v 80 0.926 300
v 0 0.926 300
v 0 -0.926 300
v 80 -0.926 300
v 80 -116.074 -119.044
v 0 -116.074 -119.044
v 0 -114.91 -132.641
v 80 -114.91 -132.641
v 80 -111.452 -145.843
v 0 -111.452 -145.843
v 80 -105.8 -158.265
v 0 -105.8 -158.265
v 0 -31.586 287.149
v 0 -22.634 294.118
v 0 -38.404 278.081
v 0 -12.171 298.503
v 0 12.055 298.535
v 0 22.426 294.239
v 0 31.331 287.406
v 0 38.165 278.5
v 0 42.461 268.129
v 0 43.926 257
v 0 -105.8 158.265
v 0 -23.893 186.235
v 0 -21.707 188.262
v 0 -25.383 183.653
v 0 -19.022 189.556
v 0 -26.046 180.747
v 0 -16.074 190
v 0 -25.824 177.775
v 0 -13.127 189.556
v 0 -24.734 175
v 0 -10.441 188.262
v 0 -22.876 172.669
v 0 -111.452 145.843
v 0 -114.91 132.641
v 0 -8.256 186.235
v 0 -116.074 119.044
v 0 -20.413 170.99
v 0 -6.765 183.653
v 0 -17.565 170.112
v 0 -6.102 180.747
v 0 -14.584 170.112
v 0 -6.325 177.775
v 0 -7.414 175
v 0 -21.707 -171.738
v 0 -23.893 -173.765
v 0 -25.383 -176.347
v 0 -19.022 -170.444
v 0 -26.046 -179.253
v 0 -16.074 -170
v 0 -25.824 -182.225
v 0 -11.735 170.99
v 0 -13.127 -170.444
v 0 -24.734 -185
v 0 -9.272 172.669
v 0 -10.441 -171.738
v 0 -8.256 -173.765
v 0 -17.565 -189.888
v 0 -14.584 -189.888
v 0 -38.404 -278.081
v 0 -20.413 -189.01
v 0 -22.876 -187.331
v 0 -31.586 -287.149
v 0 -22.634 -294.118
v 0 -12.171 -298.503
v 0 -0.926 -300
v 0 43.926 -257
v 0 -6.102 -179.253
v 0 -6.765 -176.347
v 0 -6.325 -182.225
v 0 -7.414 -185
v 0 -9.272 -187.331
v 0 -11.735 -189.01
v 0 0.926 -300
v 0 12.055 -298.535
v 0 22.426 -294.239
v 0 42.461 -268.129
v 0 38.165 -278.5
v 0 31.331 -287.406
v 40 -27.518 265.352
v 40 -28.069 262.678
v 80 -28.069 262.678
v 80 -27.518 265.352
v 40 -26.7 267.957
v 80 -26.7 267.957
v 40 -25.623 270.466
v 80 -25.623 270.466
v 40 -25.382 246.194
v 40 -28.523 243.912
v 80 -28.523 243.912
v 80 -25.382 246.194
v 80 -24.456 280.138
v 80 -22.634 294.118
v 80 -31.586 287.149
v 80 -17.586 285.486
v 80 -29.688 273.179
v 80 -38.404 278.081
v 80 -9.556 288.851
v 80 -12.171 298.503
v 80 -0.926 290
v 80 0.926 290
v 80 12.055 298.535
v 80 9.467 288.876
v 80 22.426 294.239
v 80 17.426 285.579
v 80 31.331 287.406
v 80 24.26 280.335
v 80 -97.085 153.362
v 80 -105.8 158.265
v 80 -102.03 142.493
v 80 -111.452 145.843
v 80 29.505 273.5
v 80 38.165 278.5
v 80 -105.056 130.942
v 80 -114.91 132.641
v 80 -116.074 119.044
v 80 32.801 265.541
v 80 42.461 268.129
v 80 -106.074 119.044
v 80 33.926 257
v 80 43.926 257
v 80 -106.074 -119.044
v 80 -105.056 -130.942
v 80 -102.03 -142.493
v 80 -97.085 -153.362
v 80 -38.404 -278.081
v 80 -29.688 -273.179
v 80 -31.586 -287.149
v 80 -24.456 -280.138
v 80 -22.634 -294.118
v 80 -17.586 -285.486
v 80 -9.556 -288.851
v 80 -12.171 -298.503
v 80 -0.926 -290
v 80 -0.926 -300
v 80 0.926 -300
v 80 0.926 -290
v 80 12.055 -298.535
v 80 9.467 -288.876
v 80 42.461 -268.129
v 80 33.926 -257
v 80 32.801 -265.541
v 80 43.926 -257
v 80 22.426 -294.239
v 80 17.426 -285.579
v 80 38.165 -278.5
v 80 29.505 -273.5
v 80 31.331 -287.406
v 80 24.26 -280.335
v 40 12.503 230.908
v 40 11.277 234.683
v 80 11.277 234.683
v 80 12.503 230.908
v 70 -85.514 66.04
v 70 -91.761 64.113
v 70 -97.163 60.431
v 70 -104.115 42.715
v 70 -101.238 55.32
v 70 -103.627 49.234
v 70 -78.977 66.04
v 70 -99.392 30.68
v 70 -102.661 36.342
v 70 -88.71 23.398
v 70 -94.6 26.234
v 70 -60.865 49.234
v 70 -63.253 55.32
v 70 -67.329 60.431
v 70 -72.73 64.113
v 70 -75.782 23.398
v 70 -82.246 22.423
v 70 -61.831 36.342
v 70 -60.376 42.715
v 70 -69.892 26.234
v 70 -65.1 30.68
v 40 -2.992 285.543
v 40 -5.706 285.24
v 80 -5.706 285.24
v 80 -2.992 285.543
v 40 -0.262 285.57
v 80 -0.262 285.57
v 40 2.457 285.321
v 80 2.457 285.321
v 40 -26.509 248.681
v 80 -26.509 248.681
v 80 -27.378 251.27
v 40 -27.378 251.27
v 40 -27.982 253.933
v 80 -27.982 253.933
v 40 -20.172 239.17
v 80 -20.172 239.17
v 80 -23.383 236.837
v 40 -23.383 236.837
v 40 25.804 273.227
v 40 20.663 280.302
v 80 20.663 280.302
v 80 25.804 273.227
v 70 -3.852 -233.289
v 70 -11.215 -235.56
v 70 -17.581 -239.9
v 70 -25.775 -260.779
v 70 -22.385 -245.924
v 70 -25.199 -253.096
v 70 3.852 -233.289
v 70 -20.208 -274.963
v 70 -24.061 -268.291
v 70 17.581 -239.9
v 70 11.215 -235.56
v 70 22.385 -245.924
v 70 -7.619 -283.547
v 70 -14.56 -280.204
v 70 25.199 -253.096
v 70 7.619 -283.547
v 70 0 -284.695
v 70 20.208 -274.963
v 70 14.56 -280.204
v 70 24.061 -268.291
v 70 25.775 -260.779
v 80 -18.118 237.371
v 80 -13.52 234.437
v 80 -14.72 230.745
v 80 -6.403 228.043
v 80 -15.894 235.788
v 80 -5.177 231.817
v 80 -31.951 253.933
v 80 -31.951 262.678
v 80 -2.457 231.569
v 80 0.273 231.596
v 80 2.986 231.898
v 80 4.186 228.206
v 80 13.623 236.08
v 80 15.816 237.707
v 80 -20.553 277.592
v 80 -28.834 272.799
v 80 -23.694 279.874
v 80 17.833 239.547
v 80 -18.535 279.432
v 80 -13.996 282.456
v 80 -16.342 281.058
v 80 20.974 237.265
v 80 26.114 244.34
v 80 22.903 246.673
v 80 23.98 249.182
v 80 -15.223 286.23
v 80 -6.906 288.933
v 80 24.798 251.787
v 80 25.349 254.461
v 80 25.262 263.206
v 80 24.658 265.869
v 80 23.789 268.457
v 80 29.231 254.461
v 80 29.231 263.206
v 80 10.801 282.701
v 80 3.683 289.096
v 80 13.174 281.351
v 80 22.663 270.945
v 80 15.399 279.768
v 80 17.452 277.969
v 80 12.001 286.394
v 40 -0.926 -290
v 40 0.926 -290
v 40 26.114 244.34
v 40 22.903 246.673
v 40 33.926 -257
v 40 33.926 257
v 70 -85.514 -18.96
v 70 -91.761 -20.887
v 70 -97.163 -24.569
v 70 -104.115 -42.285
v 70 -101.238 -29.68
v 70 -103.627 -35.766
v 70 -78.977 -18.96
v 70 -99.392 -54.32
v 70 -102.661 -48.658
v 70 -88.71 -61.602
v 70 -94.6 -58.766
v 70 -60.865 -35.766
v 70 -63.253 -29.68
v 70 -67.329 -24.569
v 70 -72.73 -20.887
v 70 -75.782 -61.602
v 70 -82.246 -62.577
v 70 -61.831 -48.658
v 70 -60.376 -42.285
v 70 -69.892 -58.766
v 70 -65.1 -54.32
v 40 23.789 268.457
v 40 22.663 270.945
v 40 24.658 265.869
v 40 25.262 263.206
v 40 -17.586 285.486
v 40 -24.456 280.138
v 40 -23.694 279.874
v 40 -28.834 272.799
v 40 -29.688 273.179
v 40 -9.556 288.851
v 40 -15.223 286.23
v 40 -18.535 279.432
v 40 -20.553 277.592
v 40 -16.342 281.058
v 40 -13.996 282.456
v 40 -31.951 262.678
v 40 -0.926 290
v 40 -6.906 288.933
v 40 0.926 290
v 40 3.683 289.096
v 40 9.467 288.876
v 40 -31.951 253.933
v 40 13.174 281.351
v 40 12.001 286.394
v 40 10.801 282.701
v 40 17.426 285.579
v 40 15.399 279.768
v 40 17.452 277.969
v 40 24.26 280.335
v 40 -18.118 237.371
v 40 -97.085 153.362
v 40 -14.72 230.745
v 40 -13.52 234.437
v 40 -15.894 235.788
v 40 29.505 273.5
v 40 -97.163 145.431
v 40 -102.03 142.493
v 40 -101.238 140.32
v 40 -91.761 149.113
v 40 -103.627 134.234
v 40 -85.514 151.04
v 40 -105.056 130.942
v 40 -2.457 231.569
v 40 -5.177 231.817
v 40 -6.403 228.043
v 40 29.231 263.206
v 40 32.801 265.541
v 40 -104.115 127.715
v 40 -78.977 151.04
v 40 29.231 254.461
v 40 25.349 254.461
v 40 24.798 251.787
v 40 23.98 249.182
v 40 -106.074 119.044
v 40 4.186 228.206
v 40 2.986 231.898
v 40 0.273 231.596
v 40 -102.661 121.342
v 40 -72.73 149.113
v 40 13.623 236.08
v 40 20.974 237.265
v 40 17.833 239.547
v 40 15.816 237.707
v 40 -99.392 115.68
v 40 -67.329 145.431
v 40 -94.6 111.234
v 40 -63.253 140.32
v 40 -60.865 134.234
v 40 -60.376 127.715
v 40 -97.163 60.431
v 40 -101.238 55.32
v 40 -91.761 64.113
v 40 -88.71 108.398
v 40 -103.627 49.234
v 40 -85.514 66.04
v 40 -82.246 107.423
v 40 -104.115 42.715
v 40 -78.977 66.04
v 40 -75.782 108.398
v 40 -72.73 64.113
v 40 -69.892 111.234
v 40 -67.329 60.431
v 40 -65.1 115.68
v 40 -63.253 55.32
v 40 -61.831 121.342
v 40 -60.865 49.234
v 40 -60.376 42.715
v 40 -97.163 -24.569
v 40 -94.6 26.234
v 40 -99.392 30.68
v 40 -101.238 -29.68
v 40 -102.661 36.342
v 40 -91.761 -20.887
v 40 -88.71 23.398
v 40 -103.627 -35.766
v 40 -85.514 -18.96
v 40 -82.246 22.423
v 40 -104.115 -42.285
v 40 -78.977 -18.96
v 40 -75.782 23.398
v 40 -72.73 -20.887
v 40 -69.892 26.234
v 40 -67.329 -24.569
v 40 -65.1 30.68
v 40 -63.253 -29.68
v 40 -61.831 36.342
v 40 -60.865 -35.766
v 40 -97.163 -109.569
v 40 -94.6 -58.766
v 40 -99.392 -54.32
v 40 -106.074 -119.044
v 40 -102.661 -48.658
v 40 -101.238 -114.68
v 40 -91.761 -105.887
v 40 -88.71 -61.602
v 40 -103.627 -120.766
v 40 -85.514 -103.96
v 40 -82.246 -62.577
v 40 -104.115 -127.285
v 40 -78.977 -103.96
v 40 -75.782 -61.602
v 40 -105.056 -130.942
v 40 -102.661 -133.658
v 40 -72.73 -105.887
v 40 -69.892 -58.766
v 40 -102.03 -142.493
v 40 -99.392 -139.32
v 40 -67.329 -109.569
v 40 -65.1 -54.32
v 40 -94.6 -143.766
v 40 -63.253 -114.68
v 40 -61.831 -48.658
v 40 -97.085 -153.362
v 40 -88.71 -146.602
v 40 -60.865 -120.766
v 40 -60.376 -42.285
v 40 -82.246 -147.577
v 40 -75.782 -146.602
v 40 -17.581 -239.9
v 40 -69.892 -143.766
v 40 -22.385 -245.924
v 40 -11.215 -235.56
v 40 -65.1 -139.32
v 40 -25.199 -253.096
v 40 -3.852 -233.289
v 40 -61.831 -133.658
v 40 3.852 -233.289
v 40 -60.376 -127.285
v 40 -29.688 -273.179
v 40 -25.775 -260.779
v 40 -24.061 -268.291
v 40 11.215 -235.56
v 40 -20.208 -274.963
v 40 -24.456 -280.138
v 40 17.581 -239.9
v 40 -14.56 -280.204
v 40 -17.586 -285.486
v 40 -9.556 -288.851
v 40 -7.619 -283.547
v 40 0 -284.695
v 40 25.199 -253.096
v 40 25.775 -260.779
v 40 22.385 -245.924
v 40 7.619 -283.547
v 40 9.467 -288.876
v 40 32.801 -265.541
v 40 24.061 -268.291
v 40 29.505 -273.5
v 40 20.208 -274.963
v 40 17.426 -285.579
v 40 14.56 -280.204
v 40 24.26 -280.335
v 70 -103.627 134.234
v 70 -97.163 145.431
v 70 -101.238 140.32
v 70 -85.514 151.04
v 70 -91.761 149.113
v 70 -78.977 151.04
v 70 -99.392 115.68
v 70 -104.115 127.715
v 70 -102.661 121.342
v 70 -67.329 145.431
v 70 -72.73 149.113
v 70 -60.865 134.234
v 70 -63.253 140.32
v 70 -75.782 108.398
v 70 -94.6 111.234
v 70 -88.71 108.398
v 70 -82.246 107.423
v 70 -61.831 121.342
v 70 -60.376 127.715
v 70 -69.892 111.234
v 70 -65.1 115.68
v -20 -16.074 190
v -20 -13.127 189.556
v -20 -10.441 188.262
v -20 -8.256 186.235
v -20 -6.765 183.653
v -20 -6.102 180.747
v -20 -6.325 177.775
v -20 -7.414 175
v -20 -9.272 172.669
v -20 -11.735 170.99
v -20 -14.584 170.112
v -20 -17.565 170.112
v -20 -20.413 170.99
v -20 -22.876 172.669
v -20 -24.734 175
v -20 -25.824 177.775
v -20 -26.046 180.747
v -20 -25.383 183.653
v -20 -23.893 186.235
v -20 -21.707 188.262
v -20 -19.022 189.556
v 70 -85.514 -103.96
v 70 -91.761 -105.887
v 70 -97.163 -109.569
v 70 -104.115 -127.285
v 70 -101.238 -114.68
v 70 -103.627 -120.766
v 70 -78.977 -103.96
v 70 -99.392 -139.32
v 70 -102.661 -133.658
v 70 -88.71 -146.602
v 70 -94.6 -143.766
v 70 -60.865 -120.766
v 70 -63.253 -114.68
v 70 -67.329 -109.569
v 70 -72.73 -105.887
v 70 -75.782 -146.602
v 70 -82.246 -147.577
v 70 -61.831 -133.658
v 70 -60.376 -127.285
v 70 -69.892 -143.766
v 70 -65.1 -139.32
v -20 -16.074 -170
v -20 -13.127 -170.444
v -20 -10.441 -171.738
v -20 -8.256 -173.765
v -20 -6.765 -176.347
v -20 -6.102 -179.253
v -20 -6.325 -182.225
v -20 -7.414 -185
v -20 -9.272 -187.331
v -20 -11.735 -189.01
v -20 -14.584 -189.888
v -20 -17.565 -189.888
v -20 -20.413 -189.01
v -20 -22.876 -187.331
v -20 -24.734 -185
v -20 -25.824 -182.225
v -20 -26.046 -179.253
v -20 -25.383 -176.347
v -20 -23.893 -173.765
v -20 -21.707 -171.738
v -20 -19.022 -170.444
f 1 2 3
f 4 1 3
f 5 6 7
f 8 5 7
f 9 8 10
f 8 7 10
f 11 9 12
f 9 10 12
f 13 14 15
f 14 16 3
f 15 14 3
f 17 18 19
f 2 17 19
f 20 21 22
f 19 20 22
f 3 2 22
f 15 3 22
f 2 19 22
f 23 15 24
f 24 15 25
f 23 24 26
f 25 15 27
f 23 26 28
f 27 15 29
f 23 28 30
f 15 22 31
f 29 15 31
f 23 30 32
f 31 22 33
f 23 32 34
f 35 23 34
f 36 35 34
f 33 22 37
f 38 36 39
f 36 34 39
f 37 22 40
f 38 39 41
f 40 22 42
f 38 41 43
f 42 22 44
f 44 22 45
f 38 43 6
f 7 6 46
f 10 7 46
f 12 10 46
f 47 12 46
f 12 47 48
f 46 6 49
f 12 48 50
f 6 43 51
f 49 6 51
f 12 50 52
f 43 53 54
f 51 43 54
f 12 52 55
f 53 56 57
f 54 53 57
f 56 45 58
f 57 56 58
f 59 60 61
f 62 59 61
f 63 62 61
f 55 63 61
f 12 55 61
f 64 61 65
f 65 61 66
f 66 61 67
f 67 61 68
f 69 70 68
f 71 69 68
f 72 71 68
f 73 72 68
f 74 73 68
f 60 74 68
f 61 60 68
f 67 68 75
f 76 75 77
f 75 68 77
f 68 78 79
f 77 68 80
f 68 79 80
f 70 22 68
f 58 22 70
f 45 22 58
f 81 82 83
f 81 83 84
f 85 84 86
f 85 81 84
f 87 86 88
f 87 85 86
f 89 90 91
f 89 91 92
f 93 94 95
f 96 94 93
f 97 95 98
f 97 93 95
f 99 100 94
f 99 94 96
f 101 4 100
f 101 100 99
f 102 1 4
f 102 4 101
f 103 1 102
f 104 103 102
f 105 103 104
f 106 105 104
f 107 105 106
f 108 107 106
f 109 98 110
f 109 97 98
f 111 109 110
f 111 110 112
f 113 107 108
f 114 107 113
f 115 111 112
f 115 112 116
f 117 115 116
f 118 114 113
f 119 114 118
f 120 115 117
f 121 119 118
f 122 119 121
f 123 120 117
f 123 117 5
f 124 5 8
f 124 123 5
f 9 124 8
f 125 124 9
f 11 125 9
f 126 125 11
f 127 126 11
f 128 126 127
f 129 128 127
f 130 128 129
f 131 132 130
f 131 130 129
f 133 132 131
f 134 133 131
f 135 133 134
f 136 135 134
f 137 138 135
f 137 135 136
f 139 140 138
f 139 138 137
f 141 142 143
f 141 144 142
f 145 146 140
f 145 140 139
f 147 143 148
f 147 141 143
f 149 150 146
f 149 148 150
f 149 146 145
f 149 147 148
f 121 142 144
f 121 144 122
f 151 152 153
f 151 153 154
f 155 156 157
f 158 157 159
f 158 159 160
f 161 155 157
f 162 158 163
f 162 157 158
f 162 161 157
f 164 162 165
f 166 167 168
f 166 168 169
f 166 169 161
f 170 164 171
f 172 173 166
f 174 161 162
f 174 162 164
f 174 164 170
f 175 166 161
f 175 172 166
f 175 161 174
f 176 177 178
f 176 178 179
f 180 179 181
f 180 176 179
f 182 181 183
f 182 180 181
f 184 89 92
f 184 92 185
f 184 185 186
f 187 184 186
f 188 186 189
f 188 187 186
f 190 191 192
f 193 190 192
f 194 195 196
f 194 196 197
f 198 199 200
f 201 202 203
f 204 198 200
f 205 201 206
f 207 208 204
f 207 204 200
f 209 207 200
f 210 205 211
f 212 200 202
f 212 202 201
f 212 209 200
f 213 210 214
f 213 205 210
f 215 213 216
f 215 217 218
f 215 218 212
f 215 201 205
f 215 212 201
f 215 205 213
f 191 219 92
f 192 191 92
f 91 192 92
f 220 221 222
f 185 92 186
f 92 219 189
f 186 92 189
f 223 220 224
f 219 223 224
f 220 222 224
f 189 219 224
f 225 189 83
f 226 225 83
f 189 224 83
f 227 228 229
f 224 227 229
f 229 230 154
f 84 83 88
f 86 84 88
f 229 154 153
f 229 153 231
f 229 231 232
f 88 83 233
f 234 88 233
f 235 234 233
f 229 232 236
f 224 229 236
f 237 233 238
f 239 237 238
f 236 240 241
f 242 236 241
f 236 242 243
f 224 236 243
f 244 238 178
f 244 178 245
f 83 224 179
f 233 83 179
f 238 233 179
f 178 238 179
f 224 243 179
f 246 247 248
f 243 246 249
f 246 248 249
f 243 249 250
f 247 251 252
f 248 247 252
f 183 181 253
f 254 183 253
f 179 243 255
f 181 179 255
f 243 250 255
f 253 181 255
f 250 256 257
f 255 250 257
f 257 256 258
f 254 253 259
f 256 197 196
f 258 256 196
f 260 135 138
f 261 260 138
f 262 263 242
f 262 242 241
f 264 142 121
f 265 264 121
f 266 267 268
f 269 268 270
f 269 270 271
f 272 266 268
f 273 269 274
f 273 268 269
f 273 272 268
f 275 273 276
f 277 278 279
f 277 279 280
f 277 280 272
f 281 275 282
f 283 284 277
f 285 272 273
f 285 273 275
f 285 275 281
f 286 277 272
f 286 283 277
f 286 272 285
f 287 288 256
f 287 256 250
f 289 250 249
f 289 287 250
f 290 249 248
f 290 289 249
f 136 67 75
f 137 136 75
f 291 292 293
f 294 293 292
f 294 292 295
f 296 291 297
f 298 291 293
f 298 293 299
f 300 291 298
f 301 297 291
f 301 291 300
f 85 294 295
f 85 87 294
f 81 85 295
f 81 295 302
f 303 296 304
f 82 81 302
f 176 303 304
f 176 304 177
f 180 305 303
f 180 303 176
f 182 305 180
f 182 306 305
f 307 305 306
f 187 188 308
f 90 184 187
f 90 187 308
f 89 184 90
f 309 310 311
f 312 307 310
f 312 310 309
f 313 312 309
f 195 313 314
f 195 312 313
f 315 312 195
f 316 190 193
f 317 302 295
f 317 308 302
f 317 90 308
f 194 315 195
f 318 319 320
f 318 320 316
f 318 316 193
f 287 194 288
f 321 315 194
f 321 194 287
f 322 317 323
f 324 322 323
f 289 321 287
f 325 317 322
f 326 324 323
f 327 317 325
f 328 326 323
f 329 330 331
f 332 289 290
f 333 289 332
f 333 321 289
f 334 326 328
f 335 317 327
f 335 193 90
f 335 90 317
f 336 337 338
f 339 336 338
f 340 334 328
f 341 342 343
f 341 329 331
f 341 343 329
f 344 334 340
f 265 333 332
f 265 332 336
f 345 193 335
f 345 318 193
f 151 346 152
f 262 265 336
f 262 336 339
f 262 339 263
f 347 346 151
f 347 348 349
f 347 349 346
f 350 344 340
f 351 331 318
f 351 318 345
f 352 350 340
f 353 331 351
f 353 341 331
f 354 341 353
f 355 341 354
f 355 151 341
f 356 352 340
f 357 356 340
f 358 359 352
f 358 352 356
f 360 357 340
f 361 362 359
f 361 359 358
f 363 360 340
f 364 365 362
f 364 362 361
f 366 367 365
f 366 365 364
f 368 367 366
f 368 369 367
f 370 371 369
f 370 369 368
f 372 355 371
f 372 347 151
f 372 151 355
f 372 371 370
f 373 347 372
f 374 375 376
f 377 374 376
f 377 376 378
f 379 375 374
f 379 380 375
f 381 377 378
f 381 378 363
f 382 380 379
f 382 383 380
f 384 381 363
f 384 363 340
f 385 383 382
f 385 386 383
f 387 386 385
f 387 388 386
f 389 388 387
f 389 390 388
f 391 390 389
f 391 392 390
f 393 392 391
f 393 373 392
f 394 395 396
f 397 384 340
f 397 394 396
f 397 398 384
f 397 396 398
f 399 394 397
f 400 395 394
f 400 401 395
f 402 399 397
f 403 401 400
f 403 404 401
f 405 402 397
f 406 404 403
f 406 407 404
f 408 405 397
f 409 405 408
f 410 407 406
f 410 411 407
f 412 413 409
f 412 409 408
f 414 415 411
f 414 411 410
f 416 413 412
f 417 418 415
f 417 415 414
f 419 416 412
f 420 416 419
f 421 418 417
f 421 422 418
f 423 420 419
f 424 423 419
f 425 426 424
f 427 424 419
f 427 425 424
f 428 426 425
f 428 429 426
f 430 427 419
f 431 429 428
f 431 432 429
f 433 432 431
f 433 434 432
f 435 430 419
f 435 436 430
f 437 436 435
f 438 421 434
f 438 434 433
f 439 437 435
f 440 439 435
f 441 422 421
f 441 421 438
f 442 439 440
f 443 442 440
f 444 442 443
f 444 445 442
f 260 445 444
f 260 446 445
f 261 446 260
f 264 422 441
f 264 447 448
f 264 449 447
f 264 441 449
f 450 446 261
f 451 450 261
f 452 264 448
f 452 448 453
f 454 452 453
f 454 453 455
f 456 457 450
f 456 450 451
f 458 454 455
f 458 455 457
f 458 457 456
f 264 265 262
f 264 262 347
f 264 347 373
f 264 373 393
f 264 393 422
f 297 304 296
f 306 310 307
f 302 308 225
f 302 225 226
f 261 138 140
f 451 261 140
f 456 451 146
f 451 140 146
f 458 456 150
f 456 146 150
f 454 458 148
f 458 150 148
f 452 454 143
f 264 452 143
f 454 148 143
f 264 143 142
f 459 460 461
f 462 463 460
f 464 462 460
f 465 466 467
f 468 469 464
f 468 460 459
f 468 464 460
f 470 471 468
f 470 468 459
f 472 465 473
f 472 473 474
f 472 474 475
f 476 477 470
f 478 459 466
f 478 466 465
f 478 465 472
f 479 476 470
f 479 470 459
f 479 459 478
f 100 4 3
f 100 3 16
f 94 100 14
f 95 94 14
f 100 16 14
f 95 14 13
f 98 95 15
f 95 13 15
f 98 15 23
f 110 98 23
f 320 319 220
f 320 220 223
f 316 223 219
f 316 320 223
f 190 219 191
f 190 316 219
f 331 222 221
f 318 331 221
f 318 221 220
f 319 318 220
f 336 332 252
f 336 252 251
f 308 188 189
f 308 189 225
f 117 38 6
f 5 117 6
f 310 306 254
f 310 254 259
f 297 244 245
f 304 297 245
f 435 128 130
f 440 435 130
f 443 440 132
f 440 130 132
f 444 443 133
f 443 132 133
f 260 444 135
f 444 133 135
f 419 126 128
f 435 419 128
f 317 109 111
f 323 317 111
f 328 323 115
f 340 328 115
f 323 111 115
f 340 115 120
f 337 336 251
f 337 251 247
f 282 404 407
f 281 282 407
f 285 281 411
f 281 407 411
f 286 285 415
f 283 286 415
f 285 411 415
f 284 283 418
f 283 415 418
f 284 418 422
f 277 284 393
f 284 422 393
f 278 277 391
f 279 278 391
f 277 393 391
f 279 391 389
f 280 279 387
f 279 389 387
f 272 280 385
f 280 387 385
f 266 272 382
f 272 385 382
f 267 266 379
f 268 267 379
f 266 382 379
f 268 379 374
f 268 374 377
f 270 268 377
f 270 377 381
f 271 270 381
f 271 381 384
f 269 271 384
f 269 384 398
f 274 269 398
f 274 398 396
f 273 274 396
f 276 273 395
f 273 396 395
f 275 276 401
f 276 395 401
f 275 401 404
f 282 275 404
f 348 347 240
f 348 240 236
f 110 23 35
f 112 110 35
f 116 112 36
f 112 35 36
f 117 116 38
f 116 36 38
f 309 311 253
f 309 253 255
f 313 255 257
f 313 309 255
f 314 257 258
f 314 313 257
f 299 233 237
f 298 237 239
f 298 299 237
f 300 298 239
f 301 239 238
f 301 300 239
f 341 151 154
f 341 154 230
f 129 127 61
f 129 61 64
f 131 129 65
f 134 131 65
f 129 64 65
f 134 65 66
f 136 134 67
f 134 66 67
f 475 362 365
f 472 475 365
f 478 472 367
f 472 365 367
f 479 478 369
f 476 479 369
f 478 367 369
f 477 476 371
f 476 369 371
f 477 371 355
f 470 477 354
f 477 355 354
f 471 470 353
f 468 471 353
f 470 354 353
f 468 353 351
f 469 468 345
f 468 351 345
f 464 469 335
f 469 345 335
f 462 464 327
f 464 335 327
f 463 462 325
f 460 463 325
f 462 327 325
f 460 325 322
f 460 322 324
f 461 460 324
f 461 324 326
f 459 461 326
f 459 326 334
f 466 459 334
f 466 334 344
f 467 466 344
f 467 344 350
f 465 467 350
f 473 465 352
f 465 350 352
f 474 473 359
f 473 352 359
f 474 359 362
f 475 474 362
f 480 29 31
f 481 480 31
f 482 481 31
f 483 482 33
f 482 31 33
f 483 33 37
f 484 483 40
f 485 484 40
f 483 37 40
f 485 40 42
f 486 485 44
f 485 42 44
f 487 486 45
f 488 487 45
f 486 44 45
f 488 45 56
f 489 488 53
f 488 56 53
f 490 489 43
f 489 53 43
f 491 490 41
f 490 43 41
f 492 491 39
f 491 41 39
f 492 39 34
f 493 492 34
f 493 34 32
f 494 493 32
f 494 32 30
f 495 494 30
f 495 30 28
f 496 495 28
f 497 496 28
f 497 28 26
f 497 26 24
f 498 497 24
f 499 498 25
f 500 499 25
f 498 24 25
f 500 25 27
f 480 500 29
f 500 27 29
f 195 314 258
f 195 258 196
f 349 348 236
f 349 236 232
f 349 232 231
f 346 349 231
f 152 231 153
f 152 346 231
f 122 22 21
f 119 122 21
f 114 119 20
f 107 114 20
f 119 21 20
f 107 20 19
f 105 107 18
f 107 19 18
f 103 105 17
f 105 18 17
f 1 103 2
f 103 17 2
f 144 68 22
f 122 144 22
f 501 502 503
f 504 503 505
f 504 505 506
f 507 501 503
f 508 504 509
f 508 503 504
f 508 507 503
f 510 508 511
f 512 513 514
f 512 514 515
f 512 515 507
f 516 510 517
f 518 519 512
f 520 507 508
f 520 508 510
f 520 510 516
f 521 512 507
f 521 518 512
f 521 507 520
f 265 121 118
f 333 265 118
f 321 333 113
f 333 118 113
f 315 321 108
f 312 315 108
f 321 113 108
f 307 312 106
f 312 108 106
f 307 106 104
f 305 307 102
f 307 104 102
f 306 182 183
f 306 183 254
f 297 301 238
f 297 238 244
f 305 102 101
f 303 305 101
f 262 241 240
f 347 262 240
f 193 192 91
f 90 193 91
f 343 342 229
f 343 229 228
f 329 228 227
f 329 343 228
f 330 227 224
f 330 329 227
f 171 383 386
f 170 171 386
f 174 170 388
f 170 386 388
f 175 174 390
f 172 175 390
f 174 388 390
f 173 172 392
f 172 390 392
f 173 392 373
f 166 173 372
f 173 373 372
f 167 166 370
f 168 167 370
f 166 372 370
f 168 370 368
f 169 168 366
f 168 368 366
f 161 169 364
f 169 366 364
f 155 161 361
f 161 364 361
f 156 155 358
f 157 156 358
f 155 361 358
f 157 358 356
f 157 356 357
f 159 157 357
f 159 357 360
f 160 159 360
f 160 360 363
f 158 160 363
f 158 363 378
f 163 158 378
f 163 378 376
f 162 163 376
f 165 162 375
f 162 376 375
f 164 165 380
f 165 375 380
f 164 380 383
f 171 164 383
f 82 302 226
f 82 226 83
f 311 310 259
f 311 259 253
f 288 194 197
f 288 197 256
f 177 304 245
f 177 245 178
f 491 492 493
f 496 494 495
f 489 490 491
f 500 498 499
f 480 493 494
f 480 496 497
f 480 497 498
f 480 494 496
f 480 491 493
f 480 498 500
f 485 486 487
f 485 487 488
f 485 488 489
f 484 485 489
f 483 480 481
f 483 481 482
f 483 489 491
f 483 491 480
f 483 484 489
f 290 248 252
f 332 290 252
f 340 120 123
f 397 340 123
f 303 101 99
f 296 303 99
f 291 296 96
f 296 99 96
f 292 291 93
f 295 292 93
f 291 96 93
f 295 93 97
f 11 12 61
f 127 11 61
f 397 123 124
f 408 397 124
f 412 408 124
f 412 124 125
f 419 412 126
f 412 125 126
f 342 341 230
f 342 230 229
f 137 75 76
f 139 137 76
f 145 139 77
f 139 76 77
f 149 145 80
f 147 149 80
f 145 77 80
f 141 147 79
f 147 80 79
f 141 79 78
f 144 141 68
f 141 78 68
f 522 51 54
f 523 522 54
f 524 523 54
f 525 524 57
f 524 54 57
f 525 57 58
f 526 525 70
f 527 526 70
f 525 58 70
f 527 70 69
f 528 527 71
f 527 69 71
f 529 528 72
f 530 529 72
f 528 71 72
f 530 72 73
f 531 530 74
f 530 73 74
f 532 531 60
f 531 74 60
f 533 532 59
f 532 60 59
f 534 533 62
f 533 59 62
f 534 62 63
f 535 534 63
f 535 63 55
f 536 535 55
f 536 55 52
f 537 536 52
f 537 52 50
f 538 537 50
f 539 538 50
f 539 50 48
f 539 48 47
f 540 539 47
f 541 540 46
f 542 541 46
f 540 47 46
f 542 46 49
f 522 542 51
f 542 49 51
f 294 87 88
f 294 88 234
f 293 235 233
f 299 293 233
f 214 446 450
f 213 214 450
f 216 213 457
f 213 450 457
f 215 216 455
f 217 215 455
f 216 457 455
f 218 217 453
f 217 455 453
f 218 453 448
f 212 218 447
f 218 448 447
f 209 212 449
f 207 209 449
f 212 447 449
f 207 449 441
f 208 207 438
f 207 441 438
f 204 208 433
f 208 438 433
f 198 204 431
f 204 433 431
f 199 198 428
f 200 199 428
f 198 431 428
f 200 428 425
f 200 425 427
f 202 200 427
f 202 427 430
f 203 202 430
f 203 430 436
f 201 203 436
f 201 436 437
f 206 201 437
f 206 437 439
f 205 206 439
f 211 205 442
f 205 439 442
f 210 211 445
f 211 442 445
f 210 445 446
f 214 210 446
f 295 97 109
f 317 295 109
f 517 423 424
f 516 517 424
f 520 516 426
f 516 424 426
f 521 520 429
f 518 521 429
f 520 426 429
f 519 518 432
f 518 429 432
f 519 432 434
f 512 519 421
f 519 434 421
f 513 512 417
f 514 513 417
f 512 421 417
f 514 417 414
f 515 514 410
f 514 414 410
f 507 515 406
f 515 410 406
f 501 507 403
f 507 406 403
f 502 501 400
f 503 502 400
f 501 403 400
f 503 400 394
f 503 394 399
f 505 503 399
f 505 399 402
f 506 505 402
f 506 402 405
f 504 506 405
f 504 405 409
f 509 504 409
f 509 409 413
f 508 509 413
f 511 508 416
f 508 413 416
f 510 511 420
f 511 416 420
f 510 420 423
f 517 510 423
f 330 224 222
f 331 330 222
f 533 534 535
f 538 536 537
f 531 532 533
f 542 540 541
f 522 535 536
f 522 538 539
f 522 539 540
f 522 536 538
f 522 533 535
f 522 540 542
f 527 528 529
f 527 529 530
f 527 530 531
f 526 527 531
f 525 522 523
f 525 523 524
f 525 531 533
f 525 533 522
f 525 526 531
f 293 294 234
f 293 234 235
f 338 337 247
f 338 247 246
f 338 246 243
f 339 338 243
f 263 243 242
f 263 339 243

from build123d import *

# Parameters (mm, degrees)
EXTRUDE_1_DEPTH     = 80
CUT_EXTRUDE_1_DEPTH = 40
EXTRUDE_2_DEPTH     = 40
SKETCH_5_R          = 21.930814163
SKETCH_5_R_2        = 25.847454044
EXTRUDE_3_DEPTH     = 30
SKETCH_6_R          = 10
EXTRUDE_4_DEPTH     = 20


with BuildPart() as part:
    # 草图2 → 凸台-拉伸1 (new body)
    with BuildSketch(Plane(origin=(0, 0, 0), x_dir=(0, 0, -1), z_dir=(1, 0, 0))):
        with BuildLine():
            Line((158.264812498, -105.800263885), (278.081233304, -38.403527181))
            ThreePointArc((278.081233304, -38.403527181), (294.118007975, -22.634152676), (300, -0.925779085))
            Line((300, -0.925779085), (300, 0.925779085))
            ThreePointArc((300, 0.925779085), (287.405591591, 31.331370676), (257, 43.925779085))
            Line((257, 43.925779085), (-257, 43.925779085))
            ThreePointArc((-257, 43.925779085), (-287.405591591, 31.331370676), (-300, 0.925779085))
            Line((-300, 0.925779085), (-300, -0.925779085))
            ThreePointArc((-300, -0.925779085), (-294.118007975, -22.634152676), (-278.081233304, -38.403527181))
            Line((-278.081233304, -38.403527181), (-158.264812498, -105.800263885))
            ThreePointArc((-158.264812498, -105.800263885), (-139.316019316, -113.463120111), (-119.043913327, -116.074220915))
            Line((-119.043913327, -116.074220915), (119.043913327, -116.074220915))
            ThreePointArc((119.043913327, -116.074220915), (139.316019316, -113.463120111), (158.264812498, -105.800263885))
        make_face()
    extrude(amount=EXTRUDE_1_DEPTH)

    # 草图3 → 切除-拉伸1 (cut)
    with BuildSketch(Plane(origin=(80, 0, 0), x_dir=(0, 0, -1), z_dir=(1, 0, 0))):
        with BuildLine():
            Line((257, 33.925779085), (-257, 33.925779085))
            ThreePointArc((-257, 33.925779085), (-280.334523779, 24.260302864), (-290, 0.925779085))
            Line((-290, 0.925779085), (-290, -0.925779085))
            ThreePointArc((-290, -0.925779085), (-285.485913097, -17.585693701), (-273.178620908, -29.68777181))
            Line((-273.178620908, -29.68777181), (-153.362200102, -97.084508514))
            ThreePointArc((-153.362200102, -97.084508514), (-136.782006067, -103.789507712), (-119.043913327, -106.074220915))
            Line((-119.043913327, -106.074220915), (119.043913327, -106.074220915))
            ThreePointArc((119.043913327, -106.074220915), (136.782006067, -103.789507712), (153.362200102, -97.084508514))
            Line((153.362200102, -97.084508514), (273.178620908, -29.68777181))
            ThreePointArc((273.178620908, -29.68777181), (285.485913097, -17.585693701), (290, -0.925779085))
            Line((290, -0.925779085), (290, 0.925779085))
            ThreePointArc((290, 0.925779085), (280.334523779, 24.260302864), (257, 33.925779085))
        make_face()
    extrude(amount=-CUT_EXTRUDE_1_DEPTH, mode=Mode.SUBTRACT)

    # 草图4 → 凸台-拉伸2 (add)
    with BuildSketch(Plane(origin=(40, 0, 0), x_dir=(0, 0, -1), z_dir=(1, 0, 0))):
        with BuildLine():
            Line((-237.264786543, 20.974123526), (-239.546765639, 17.833248756))
            ThreePointArc((-239.546765639, 17.833248756), (-236.865961455, 14.739716181), (-234.683185749, 11.276748513))
            Line((-234.683185749, 11.276748513), (-230.908435146, 12.503239332))
            Line((-230.908435146, 12.503239332), (-228.206060722, 4.186186056))
            Line((-228.206060722, 4.186186056), (-231.89838046, 2.986478649))
            ThreePointArc((-231.89838046, 2.986478649), (-231.547897142, -1.09197894), (-231.817475826, -5.176582004))
            Line((-231.817475826, -5.176582004), (-228.042725222, -6.403072824))
            Line((-228.042725222, -6.403072824), (-230.745099646, -14.720126099))
            Line((-230.745099646, -14.720126099), (-234.437419384, -13.520418692))
            ThreePointArc((-234.437419384, -13.520418692), (-236.551129646, -17.025969117), (-239.170092825, -20.172028037))
            Line((-239.170092825, -20.172028037), (-236.837168653, -23.383022689))
            Line((-236.837168653, -23.383022689), (-243.912076745, -28.5232443))
            Line((-243.912076745, -28.5232443), (-246.194055841, -25.38236953))
            ThreePointArc((-246.194055841, -25.38236953), (-249.964594205, -26.976011679), (-253.932586961, -27.981838877))
            Line((-253.932586961, -27.981838877), (-253.932586961, -31.950846543))
            Line((-253.932586961, -31.950846543), (-262.677654297, -31.950846543))
            Line((-262.677654297, -31.950846543), (-262.677654297, -28.068511818))
            ThreePointArc((-262.677654297, -28.068511818), (-266.664803265, -27.141528556), (-270.466187231, -25.62293223))
            Line((-270.466187231, -25.62293223), (-272.799111403, -28.833926882))
            Line((-272.799111403, -28.833926882), (-279.874019495, -23.693705272))
            Line((-279.874019495, -23.693705272), (-277.592040399, -20.552830502))
            ThreePointArc((-277.592040399, -20.552830502), (-280.272844583, -17.459297927), (-282.455620289, -13.996330258))
            Line((-282.455620289, -13.996330258), (-286.230370892, -15.222821078))
            Line((-286.230370892, -15.222821078), (-288.932745316, -6.905767802))
            Line((-288.932745316, -6.905767802), (-285.240425578, -5.706060395))
            ThreePointArc((-285.240425578, -5.706060395), (-285.590908896, -1.627602806), (-285.321330213, 2.457000258))
            Line((-285.321330213, 2.457000258), (-289.096080816, 3.683491078))
            Line((-289.096080816, 3.683491078), (-286.393706392, 12.000544353))
            Line((-286.393706392, 12.000544353), (-282.701386654, 10.800836946))
            ThreePointArc((-282.701386654, 10.800836946), (-280.587676392, 14.306387371), (-277.968713213, 17.452446291))
            Line((-277.968713213, 17.452446291), (-280.301637385, 20.663440943))
            Line((-280.301637385, 20.663440943), (-273.226729293, 25.803662554))
            Line((-273.226729293, 25.803662554), (-270.944750197, 22.662787784))
            ThreePointArc((-270.944750197, 22.662787784), (-267.174211833, 24.256429933), (-263.206219077, 25.262257132))
            Line((-263.206219077, 25.262257132), (-263.206219077, 29.231264797))
            Line((-263.206219077, 29.231264797), (-254.461151741, 29.231264797))
            Line((-254.461151741, 29.231264797), (-254.461151741, 25.348930073))
            ThreePointArc((-254.461151741, 25.348930073), (-250.474002773, 24.42194681), (-246.672618807, 22.903350484))
            Line((-246.672618807, 22.903350484), (-244.339694635, 26.114345136))
            Line((-244.339694635, 26.114345136), (-237.264786543, 20.974123526))
        make_face()
    extrude(amount=EXTRUDE_2_DEPTH)

    # 草图5 → 凸台-拉伸3 (add)
    with BuildSketch(Plane(origin=(40, 0, 0), x_dir=(0, 0, -1), z_dir=(1, 0, 0))):
        with Locations((-129.354117612, -82.245801831)):
            Circle(SKETCH_5_R)
        with Locations((-44.354117612, -82.245801831)):
            Circle(SKETCH_5_R)
        with Locations((40.645882388, -82.245801831)):
            Circle(SKETCH_5_R)
        with Locations((125.645882388, -82.245801831)):
            Circle(SKETCH_5_R)
        with Locations((258.847706699, 0)):
            Circle(SKETCH_5_R_2)
    extrude(amount=EXTRUDE_3_DEPTH)

    # 草图6 → 凸台-拉伸4 (add)
    with BuildSketch(Plane.ZY):
        with Locations((-180, -16.074220915)):
            Circle(SKETCH_6_R)
        with Locations((180, -16.074220915)):
            Circle(SKETCH_6_R)
    extrude(amount=EXTRUDE_4_DEPTH)


solid = part.part
